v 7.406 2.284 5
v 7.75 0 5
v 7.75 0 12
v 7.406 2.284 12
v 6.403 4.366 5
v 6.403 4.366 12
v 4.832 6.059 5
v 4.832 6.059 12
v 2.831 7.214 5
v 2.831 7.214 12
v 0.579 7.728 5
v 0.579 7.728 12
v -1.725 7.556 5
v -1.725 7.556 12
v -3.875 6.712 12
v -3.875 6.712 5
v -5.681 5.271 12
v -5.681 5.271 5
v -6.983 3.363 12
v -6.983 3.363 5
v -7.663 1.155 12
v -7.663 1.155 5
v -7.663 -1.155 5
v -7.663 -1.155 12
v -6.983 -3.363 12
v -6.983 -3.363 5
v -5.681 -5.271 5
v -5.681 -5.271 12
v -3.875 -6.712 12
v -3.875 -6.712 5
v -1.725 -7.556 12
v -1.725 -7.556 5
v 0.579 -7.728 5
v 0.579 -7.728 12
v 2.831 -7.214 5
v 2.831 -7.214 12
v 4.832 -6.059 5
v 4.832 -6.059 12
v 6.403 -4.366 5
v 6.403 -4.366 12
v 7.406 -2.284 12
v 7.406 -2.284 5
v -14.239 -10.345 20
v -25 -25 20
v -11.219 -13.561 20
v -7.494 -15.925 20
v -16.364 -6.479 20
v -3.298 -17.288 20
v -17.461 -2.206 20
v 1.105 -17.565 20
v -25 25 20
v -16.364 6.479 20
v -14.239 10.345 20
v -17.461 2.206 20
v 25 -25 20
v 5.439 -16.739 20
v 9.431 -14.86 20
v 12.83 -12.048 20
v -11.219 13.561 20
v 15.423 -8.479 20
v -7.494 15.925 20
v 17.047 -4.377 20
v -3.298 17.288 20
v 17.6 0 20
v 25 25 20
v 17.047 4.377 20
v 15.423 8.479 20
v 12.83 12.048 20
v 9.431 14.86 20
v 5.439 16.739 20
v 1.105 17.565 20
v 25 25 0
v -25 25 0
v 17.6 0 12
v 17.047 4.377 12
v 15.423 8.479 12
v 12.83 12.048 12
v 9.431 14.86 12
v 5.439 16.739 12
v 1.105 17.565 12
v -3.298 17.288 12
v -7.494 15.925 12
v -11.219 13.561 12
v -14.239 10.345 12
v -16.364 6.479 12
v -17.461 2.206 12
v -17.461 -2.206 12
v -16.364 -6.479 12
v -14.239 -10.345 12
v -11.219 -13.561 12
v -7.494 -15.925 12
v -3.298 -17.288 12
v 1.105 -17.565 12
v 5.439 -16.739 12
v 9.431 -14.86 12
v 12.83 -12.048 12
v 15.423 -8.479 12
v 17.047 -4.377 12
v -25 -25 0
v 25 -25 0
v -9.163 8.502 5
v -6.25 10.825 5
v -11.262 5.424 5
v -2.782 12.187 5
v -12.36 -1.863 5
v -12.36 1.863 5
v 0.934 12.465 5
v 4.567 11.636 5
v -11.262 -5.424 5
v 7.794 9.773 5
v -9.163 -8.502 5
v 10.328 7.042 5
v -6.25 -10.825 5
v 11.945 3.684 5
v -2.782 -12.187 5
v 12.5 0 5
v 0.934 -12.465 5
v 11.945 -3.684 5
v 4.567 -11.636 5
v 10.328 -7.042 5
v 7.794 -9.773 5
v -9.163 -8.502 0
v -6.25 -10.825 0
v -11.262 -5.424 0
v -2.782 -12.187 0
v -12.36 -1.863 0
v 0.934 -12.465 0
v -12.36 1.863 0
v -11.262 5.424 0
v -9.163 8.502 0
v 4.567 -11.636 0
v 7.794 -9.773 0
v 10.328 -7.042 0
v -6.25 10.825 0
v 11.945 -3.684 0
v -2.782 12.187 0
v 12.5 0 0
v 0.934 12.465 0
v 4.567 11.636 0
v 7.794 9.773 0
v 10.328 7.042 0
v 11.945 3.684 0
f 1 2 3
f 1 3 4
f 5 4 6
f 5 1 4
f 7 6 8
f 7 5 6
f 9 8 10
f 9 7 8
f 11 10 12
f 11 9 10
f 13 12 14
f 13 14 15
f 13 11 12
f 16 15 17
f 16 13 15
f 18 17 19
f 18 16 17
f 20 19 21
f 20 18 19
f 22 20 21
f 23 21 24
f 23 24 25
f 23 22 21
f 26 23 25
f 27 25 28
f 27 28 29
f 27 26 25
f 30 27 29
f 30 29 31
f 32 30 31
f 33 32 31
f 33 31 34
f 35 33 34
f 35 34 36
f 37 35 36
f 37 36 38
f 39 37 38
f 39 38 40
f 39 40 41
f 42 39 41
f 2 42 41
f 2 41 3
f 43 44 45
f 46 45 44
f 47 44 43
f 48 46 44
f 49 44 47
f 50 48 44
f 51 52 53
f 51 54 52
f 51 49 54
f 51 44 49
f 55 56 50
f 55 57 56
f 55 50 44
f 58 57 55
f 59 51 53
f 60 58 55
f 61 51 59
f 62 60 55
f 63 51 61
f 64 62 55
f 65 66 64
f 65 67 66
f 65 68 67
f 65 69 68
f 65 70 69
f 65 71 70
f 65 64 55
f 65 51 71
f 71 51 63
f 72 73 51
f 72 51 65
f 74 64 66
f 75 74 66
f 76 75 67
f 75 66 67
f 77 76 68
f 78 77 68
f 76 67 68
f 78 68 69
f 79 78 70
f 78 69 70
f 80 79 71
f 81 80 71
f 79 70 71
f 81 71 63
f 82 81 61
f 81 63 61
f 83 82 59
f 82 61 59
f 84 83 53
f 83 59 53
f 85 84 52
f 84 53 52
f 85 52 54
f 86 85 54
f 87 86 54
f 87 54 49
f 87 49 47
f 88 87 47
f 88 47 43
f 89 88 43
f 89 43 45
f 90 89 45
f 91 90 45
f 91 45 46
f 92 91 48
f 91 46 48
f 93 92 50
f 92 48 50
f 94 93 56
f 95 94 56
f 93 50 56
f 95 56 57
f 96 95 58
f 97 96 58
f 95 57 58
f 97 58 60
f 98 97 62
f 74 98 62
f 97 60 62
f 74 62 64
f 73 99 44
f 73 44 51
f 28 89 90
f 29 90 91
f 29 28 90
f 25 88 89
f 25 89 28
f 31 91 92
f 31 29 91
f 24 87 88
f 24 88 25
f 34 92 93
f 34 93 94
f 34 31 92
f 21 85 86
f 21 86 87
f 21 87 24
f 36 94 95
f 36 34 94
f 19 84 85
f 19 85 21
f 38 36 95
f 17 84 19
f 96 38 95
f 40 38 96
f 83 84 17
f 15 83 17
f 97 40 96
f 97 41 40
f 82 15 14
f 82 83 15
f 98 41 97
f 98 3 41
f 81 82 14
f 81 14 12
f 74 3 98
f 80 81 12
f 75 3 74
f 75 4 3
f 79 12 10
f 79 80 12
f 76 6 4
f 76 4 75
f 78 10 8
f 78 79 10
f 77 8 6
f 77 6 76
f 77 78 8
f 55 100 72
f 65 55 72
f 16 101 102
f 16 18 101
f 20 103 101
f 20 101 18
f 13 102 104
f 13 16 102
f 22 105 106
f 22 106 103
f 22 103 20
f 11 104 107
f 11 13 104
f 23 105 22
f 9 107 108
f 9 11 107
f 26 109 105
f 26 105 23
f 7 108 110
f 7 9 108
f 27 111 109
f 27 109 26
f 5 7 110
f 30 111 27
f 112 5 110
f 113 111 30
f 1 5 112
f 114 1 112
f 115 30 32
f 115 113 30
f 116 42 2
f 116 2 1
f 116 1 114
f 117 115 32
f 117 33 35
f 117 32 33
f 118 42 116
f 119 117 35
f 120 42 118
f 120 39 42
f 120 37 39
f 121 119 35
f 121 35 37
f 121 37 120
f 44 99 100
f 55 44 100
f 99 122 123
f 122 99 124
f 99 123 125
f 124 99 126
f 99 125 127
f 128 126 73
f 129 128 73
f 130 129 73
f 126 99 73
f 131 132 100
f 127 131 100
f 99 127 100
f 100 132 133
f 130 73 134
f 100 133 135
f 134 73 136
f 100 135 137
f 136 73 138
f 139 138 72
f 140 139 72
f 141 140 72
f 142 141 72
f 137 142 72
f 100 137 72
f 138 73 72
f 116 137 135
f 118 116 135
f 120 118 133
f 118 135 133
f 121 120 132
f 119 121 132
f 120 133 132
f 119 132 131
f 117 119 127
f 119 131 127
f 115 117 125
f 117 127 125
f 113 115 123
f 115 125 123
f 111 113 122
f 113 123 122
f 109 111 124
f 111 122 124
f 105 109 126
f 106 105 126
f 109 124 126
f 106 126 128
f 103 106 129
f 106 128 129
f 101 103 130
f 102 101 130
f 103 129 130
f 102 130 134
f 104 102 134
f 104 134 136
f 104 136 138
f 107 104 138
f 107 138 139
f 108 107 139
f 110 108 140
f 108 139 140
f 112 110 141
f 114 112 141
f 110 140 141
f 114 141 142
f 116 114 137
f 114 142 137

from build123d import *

# Parameters (mm, degrees)
F0_W     = 50
F0_H     = 50
F0_R     = 7.75
F1_DEPTH = 20
F2_R     = 17.6
F2_R_2   = 7.75
F3_DEPTH = 8
F4_R     = 12.5
F4_R_2   = 7.75
F5_DEPTH = 5


with BuildPart() as f1:
    # F0 (on Top) → F1 (new body)
    with BuildSketch(Plane.XY):
        Rectangle(F0_W, F0_H)
        Circle(F0_R, mode=Mode.SUBTRACT)
    extrude(amount=F1_DEPTH)

    # F2 (on face) → F3 (cut)
    with BuildSketch(Plane.XY.offset(20)):
        Circle(F2_R)
        Circle(F2_R_2, mode=Mode.SUBTRACT)
    extrude(amount=-F3_DEPTH, mode=Mode.SUBTRACT)

    # F4 (on face) → F5 (cut)
    with BuildSketch(Plane(origin=(0, 0, 0), x_dir=(1, 0, 0), z_dir=(0, 0, -1))):
        Circle(F4_R)
        Circle(F4_R_2, mode=Mode.SUBTRACT)
    extrude(amount=-F5_DEPTH, mode=Mode.SUBTRACT)


solid = f1.part
